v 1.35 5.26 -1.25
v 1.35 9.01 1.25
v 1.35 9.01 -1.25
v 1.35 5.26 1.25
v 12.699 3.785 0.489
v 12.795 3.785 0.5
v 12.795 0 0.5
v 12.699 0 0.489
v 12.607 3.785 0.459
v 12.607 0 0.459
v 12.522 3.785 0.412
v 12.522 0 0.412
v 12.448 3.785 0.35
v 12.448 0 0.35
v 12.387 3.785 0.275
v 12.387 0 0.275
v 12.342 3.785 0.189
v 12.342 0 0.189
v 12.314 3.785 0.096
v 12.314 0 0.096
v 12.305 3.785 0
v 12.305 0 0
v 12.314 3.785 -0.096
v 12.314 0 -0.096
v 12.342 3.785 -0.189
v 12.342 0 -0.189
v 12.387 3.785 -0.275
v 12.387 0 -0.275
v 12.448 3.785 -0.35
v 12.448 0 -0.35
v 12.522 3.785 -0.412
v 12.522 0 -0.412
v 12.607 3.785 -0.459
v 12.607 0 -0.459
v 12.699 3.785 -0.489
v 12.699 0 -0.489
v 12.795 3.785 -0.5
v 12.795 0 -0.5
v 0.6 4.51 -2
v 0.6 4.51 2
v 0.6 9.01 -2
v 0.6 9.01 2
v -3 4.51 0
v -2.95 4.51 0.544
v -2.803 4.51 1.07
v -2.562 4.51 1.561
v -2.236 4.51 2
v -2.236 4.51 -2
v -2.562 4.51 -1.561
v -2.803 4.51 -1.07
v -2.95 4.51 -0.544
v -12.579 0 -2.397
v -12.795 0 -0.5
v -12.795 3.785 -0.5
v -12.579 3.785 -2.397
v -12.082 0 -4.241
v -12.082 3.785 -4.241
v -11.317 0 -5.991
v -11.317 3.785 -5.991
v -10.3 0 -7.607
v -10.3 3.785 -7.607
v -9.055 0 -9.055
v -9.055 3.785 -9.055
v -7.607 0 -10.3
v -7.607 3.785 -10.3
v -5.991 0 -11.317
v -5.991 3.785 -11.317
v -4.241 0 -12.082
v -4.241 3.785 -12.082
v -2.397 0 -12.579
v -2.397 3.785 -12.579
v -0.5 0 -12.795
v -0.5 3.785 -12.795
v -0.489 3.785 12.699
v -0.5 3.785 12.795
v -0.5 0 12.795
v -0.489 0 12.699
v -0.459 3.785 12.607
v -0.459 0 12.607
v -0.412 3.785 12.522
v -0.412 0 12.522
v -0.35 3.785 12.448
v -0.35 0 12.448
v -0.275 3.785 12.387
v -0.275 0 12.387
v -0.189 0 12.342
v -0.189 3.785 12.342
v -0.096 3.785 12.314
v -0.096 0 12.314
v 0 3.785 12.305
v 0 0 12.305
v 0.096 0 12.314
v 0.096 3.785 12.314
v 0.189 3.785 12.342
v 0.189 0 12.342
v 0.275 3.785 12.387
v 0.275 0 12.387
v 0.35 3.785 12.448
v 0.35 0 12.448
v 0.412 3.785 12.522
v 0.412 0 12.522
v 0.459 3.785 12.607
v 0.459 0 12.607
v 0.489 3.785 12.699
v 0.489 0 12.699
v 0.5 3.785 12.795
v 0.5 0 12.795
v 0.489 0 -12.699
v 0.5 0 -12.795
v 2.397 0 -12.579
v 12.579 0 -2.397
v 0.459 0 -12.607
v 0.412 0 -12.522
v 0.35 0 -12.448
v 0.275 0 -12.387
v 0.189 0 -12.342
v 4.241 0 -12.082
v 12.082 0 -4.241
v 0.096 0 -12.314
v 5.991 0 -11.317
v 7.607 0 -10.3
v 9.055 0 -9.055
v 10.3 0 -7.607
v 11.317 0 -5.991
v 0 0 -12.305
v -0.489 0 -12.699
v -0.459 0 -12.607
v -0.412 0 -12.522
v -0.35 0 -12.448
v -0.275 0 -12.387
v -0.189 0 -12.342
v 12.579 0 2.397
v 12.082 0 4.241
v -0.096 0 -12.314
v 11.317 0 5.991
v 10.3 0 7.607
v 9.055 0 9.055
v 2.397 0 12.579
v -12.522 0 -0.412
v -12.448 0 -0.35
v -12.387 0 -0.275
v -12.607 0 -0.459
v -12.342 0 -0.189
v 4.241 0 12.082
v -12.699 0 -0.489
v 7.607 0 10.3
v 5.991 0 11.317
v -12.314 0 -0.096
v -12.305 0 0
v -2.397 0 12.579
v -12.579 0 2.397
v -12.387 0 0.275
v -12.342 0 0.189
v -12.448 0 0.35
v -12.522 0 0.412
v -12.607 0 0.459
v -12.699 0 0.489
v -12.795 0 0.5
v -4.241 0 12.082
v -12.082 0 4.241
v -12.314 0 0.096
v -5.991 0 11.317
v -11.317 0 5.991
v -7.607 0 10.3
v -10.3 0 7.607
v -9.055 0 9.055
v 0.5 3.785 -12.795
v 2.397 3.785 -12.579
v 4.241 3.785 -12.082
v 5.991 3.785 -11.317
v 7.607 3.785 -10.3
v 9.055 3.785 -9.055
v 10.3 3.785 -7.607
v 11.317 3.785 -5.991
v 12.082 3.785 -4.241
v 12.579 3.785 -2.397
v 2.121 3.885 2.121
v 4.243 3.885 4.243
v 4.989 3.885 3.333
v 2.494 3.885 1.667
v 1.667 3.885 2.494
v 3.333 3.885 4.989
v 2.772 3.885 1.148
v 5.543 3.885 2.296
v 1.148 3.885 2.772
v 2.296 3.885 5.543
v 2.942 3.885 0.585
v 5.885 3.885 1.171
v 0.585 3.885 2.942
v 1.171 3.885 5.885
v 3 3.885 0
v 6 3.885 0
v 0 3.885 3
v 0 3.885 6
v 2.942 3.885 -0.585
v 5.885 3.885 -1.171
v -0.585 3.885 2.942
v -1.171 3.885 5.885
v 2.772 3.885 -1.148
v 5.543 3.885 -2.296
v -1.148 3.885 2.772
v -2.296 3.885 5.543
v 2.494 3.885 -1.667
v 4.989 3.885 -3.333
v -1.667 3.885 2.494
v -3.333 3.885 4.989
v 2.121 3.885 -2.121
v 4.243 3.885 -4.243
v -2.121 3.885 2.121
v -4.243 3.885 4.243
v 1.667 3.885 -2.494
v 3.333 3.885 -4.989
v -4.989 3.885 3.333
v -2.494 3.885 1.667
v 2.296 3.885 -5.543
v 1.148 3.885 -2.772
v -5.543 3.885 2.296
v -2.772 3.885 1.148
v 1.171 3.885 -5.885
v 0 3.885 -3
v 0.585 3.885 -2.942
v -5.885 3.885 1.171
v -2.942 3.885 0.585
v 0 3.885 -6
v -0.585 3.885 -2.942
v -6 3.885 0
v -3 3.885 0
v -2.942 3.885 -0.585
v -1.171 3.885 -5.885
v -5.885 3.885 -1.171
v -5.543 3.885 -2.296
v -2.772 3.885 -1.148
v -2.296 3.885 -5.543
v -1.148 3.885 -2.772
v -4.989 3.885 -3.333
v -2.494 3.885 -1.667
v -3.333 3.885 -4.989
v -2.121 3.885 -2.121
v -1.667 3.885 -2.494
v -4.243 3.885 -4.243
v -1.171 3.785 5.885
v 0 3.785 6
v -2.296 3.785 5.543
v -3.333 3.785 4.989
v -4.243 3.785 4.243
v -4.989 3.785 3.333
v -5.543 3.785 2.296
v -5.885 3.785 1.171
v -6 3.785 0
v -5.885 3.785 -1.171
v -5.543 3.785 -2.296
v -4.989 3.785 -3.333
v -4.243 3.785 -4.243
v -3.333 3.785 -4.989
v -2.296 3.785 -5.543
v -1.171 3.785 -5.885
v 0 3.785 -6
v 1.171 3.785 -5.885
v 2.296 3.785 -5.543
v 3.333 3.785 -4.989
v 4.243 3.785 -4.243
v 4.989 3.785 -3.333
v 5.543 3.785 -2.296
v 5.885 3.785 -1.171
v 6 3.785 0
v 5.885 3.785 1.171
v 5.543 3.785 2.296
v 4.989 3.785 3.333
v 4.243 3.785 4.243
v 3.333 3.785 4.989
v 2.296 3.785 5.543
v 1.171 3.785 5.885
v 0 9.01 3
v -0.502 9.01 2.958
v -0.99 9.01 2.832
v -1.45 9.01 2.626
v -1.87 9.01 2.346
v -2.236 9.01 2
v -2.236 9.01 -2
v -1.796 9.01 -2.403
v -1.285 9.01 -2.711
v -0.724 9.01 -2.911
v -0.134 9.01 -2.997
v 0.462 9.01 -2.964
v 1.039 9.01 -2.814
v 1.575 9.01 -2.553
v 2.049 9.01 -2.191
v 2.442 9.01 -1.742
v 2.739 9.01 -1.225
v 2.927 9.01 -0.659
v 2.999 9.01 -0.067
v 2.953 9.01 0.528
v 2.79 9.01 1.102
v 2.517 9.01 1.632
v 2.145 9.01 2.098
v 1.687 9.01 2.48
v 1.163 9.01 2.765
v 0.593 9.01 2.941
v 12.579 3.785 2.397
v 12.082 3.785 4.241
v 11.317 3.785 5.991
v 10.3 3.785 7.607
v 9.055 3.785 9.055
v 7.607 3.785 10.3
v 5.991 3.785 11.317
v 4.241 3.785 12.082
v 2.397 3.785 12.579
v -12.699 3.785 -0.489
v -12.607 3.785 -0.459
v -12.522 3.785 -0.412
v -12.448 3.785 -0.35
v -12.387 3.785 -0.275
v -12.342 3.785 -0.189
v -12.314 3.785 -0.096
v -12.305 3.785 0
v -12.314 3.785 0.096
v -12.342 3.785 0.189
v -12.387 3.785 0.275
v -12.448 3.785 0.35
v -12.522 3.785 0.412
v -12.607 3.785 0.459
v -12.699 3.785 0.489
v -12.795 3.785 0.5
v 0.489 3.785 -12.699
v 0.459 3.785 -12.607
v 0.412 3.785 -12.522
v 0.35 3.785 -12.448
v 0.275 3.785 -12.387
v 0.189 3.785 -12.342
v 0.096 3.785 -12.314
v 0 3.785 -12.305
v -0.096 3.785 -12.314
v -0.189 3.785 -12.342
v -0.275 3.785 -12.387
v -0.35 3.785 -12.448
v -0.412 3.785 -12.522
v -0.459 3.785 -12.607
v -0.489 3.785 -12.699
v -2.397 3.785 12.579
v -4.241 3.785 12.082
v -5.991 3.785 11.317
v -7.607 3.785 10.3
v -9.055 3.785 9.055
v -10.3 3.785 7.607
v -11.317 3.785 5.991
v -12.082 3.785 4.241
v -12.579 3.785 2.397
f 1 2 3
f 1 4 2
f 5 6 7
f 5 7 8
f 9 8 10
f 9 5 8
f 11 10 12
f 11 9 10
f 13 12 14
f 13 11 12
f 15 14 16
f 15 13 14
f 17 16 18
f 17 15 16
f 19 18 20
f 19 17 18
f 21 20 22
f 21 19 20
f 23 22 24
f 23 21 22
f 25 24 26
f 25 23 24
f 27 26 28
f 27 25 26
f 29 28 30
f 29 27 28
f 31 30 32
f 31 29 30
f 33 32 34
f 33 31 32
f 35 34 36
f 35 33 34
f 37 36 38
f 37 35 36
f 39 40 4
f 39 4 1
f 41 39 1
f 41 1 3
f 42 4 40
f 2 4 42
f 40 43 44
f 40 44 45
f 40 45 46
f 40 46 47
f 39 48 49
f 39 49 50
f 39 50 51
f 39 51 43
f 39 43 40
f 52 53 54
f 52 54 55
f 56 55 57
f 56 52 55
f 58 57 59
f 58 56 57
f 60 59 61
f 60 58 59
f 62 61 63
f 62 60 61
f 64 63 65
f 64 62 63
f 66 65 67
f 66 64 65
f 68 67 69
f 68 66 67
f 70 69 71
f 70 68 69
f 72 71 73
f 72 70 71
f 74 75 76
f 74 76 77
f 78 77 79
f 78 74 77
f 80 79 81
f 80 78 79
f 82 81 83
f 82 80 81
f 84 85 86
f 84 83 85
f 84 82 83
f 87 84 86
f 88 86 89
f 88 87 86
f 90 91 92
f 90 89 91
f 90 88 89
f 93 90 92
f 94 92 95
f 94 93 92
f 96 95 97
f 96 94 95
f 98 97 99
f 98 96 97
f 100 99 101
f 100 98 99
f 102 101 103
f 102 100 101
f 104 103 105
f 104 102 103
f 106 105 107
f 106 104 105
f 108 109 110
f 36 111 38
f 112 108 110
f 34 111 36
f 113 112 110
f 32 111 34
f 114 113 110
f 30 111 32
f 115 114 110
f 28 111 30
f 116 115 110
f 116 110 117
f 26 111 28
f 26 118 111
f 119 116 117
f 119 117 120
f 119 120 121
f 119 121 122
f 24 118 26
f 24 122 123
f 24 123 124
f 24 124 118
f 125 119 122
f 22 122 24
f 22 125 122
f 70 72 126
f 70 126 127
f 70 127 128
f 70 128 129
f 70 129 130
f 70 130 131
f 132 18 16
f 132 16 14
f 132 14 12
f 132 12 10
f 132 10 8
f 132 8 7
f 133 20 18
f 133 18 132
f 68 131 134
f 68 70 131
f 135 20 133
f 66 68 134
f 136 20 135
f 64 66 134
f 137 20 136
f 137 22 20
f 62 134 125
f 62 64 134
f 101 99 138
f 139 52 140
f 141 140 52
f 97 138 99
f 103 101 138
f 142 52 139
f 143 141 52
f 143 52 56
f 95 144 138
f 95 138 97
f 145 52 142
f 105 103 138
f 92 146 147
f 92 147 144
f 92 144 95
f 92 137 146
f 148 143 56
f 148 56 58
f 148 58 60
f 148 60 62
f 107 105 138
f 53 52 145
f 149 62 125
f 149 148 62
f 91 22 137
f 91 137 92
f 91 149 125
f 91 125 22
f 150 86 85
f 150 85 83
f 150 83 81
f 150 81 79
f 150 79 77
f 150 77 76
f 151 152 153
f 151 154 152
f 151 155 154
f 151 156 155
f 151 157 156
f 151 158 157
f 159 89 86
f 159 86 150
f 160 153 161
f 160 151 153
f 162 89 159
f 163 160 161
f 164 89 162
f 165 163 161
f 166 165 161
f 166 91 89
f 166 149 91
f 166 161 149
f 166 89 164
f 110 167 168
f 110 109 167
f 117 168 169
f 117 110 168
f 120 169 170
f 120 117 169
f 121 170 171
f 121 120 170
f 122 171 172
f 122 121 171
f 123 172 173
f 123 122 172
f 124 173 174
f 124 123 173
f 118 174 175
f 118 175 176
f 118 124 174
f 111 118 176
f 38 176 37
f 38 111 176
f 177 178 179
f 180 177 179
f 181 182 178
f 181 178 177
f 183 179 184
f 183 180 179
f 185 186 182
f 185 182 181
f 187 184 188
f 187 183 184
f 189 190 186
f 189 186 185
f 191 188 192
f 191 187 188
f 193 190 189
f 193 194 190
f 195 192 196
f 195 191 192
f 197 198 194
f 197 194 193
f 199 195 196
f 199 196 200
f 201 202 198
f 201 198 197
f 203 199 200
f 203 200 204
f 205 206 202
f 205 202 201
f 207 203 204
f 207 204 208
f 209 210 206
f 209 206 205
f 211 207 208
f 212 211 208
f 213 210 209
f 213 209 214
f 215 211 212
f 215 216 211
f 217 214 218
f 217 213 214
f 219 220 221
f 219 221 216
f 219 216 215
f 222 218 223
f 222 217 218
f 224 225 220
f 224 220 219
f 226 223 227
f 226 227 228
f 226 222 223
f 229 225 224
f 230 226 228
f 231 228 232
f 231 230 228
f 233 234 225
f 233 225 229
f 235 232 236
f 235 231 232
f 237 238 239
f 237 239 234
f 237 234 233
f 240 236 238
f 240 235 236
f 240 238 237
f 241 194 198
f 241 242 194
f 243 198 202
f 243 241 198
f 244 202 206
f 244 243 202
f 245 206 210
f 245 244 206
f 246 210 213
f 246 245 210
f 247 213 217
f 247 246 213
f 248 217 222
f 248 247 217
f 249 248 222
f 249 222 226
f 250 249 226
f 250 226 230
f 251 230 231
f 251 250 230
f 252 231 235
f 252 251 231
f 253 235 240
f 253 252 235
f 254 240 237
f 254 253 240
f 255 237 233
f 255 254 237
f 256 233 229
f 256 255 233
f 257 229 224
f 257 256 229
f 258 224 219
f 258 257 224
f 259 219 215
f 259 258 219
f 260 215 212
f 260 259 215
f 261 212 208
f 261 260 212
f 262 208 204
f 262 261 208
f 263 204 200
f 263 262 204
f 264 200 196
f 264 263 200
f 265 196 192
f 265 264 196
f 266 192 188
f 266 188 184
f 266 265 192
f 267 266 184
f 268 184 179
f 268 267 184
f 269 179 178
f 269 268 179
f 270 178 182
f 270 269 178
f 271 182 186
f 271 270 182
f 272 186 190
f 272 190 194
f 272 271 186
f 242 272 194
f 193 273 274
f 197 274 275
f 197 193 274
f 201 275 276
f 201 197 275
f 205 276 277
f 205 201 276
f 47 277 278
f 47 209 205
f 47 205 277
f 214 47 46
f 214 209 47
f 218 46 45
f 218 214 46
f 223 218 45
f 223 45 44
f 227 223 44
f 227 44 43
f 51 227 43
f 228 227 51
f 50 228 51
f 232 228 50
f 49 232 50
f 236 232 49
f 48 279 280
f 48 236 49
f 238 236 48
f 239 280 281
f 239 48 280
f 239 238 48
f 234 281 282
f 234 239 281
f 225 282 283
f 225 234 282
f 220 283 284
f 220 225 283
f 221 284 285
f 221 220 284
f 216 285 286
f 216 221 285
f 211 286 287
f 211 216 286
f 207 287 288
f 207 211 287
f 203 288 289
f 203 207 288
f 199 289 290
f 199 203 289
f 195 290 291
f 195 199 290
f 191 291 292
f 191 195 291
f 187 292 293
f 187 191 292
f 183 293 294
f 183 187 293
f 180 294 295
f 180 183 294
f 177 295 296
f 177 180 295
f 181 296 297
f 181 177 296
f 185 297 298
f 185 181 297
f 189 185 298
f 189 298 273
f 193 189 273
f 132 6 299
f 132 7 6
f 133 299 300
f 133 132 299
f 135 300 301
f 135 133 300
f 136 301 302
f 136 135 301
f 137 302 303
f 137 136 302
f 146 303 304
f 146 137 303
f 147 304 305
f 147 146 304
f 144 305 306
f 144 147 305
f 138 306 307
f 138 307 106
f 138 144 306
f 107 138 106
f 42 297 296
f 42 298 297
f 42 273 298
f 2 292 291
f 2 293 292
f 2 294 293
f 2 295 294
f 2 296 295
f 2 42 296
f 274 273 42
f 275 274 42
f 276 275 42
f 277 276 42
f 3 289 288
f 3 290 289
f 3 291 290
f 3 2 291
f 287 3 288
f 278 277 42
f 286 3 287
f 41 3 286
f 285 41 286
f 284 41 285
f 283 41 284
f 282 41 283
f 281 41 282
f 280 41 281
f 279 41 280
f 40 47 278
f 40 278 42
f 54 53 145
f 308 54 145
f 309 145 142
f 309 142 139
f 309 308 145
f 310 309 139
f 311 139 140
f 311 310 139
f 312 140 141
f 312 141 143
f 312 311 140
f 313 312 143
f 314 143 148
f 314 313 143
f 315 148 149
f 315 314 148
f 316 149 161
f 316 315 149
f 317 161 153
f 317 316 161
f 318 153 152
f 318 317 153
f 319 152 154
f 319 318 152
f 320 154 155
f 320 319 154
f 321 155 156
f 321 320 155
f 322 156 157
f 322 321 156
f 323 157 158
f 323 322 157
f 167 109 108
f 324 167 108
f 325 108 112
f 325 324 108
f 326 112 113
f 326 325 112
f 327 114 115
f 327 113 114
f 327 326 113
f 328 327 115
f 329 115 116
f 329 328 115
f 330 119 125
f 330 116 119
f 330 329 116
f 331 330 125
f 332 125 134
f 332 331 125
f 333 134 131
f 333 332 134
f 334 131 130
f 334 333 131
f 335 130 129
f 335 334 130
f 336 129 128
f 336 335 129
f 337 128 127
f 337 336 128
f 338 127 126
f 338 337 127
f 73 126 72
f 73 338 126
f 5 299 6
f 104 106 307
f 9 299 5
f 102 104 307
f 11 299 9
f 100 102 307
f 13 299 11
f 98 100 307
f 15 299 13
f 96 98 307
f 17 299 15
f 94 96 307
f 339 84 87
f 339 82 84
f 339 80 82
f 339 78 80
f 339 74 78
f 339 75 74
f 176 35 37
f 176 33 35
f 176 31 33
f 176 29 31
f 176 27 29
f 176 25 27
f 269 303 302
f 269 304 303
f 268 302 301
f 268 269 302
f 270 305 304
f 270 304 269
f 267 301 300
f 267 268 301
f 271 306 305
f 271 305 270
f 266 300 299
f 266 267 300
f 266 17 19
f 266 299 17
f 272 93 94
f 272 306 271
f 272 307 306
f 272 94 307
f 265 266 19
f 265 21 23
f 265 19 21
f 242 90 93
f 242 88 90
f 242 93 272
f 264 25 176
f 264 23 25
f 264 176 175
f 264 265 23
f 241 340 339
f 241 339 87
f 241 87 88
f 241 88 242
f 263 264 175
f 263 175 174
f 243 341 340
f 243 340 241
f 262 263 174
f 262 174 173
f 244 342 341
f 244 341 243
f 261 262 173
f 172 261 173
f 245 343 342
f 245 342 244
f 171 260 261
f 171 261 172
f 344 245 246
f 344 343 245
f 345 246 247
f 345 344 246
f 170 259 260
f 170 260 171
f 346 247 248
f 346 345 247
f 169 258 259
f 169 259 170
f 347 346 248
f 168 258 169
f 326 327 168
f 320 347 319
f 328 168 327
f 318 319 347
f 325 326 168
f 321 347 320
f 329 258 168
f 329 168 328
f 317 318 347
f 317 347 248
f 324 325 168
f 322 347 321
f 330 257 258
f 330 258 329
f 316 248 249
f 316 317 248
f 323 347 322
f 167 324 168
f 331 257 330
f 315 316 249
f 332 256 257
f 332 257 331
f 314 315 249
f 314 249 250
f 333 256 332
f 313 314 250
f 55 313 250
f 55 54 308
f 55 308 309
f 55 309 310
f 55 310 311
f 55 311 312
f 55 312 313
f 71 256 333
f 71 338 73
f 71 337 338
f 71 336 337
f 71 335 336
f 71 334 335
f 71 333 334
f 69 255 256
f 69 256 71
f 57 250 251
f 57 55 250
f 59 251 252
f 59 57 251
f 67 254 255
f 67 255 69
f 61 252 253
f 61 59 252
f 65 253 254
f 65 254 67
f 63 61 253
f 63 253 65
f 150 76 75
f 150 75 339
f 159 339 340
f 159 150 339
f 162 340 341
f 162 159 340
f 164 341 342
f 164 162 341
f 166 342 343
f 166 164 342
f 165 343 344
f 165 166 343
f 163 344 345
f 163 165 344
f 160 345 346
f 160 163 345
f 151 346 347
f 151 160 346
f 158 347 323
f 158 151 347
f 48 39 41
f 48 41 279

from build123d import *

# Parameters (mm, degrees)
CUT_EXTRUDE1_START      = -4.5
CUT_EXTRUDE1_DEPTH      = 4.5
CHAMFER1_SIZE           = 0.75
CUT_EXTRUDE2_DEPTH      = 21.226619836
CUT_EXTRUDE2_DEPTH_BACK = 21.226619836
SKETCH3_R               = 0.5


# Read off the part's stored shape, not the designer's step: Cut-Extrude1
with BuildPart() as part:
    # Sketch1 → Revolve1 (revolve)
    with BuildSketch(Plane.XY, mode=Mode.PRIVATE) as revolve1_sk:
        Polygon((0, 9.01), (3, 9.01), (3, 3.885), (6, 3.885), (6, 3.785), (12.805, 3.785), (12.805, 0), (0, 0), align=None)
    revolve(revolve1_sk.sketch.rotate(Axis((0, 8.620253165, 0), (0, -1, 0)), 90), axis=Axis((0, 8.620253165, 0), (0, -1, 0)))

    # Cut-Extrude1 outline → Cut-Extrude1 (cut)
    with BuildSketch(Plane(origin=(0, 9.01, 0), x_dir=(1, 0, 0), z_dir=(0, 1, 0)).offset(CUT_EXTRUDE1_START)):
        with BuildLine():
            Line((1.35, -2), (1.35, 2))
            Line((1.35, 2), (-2.236067977, 2))
            ThreePointArc((-2.236067977, 2), (-3, 0), (-2.236067977, -2))
            Line((-2.236067977, -2), (1.35, -2))
        make_face()
    extrude(amount=CUT_EXTRUDE1_DEPTH, mode=Mode.SUBTRACT)

    # Chamfer1
    chamfer1_edges = [part.edges().sort_by_distance(p)[0] for p in [
        (1.35, 6.76, 2),
        (1.35, 4.51, 0),
        (1.35, 6.76, -2),
    ]]
    chamfer(chamfer1_edges, length=CHAMFER1_SIZE)

    # Sketch3 → Cut-Extrude2 (cut, two sides: drawn at the far end of the back side and taken through both)
    with BuildSketch(Plane.XZ.offset(-CUT_EXTRUDE2_DEPTH_BACK)):
        with Locations((0, -12.805)):
            Circle(SKETCH3_R)
        with Locations((-12.805, 0)):
            Circle(SKETCH3_R)
        with Locations((12.805, 0)):
            Circle(SKETCH3_R)
        with Locations((0, 12.805)):
            Circle(SKETCH3_R)
    extrude(amount=CUT_EXTRUDE2_DEPTH + CUT_EXTRUDE2_DEPTH_BACK, mode=Mode.SUBTRACT)


solid = part.part
